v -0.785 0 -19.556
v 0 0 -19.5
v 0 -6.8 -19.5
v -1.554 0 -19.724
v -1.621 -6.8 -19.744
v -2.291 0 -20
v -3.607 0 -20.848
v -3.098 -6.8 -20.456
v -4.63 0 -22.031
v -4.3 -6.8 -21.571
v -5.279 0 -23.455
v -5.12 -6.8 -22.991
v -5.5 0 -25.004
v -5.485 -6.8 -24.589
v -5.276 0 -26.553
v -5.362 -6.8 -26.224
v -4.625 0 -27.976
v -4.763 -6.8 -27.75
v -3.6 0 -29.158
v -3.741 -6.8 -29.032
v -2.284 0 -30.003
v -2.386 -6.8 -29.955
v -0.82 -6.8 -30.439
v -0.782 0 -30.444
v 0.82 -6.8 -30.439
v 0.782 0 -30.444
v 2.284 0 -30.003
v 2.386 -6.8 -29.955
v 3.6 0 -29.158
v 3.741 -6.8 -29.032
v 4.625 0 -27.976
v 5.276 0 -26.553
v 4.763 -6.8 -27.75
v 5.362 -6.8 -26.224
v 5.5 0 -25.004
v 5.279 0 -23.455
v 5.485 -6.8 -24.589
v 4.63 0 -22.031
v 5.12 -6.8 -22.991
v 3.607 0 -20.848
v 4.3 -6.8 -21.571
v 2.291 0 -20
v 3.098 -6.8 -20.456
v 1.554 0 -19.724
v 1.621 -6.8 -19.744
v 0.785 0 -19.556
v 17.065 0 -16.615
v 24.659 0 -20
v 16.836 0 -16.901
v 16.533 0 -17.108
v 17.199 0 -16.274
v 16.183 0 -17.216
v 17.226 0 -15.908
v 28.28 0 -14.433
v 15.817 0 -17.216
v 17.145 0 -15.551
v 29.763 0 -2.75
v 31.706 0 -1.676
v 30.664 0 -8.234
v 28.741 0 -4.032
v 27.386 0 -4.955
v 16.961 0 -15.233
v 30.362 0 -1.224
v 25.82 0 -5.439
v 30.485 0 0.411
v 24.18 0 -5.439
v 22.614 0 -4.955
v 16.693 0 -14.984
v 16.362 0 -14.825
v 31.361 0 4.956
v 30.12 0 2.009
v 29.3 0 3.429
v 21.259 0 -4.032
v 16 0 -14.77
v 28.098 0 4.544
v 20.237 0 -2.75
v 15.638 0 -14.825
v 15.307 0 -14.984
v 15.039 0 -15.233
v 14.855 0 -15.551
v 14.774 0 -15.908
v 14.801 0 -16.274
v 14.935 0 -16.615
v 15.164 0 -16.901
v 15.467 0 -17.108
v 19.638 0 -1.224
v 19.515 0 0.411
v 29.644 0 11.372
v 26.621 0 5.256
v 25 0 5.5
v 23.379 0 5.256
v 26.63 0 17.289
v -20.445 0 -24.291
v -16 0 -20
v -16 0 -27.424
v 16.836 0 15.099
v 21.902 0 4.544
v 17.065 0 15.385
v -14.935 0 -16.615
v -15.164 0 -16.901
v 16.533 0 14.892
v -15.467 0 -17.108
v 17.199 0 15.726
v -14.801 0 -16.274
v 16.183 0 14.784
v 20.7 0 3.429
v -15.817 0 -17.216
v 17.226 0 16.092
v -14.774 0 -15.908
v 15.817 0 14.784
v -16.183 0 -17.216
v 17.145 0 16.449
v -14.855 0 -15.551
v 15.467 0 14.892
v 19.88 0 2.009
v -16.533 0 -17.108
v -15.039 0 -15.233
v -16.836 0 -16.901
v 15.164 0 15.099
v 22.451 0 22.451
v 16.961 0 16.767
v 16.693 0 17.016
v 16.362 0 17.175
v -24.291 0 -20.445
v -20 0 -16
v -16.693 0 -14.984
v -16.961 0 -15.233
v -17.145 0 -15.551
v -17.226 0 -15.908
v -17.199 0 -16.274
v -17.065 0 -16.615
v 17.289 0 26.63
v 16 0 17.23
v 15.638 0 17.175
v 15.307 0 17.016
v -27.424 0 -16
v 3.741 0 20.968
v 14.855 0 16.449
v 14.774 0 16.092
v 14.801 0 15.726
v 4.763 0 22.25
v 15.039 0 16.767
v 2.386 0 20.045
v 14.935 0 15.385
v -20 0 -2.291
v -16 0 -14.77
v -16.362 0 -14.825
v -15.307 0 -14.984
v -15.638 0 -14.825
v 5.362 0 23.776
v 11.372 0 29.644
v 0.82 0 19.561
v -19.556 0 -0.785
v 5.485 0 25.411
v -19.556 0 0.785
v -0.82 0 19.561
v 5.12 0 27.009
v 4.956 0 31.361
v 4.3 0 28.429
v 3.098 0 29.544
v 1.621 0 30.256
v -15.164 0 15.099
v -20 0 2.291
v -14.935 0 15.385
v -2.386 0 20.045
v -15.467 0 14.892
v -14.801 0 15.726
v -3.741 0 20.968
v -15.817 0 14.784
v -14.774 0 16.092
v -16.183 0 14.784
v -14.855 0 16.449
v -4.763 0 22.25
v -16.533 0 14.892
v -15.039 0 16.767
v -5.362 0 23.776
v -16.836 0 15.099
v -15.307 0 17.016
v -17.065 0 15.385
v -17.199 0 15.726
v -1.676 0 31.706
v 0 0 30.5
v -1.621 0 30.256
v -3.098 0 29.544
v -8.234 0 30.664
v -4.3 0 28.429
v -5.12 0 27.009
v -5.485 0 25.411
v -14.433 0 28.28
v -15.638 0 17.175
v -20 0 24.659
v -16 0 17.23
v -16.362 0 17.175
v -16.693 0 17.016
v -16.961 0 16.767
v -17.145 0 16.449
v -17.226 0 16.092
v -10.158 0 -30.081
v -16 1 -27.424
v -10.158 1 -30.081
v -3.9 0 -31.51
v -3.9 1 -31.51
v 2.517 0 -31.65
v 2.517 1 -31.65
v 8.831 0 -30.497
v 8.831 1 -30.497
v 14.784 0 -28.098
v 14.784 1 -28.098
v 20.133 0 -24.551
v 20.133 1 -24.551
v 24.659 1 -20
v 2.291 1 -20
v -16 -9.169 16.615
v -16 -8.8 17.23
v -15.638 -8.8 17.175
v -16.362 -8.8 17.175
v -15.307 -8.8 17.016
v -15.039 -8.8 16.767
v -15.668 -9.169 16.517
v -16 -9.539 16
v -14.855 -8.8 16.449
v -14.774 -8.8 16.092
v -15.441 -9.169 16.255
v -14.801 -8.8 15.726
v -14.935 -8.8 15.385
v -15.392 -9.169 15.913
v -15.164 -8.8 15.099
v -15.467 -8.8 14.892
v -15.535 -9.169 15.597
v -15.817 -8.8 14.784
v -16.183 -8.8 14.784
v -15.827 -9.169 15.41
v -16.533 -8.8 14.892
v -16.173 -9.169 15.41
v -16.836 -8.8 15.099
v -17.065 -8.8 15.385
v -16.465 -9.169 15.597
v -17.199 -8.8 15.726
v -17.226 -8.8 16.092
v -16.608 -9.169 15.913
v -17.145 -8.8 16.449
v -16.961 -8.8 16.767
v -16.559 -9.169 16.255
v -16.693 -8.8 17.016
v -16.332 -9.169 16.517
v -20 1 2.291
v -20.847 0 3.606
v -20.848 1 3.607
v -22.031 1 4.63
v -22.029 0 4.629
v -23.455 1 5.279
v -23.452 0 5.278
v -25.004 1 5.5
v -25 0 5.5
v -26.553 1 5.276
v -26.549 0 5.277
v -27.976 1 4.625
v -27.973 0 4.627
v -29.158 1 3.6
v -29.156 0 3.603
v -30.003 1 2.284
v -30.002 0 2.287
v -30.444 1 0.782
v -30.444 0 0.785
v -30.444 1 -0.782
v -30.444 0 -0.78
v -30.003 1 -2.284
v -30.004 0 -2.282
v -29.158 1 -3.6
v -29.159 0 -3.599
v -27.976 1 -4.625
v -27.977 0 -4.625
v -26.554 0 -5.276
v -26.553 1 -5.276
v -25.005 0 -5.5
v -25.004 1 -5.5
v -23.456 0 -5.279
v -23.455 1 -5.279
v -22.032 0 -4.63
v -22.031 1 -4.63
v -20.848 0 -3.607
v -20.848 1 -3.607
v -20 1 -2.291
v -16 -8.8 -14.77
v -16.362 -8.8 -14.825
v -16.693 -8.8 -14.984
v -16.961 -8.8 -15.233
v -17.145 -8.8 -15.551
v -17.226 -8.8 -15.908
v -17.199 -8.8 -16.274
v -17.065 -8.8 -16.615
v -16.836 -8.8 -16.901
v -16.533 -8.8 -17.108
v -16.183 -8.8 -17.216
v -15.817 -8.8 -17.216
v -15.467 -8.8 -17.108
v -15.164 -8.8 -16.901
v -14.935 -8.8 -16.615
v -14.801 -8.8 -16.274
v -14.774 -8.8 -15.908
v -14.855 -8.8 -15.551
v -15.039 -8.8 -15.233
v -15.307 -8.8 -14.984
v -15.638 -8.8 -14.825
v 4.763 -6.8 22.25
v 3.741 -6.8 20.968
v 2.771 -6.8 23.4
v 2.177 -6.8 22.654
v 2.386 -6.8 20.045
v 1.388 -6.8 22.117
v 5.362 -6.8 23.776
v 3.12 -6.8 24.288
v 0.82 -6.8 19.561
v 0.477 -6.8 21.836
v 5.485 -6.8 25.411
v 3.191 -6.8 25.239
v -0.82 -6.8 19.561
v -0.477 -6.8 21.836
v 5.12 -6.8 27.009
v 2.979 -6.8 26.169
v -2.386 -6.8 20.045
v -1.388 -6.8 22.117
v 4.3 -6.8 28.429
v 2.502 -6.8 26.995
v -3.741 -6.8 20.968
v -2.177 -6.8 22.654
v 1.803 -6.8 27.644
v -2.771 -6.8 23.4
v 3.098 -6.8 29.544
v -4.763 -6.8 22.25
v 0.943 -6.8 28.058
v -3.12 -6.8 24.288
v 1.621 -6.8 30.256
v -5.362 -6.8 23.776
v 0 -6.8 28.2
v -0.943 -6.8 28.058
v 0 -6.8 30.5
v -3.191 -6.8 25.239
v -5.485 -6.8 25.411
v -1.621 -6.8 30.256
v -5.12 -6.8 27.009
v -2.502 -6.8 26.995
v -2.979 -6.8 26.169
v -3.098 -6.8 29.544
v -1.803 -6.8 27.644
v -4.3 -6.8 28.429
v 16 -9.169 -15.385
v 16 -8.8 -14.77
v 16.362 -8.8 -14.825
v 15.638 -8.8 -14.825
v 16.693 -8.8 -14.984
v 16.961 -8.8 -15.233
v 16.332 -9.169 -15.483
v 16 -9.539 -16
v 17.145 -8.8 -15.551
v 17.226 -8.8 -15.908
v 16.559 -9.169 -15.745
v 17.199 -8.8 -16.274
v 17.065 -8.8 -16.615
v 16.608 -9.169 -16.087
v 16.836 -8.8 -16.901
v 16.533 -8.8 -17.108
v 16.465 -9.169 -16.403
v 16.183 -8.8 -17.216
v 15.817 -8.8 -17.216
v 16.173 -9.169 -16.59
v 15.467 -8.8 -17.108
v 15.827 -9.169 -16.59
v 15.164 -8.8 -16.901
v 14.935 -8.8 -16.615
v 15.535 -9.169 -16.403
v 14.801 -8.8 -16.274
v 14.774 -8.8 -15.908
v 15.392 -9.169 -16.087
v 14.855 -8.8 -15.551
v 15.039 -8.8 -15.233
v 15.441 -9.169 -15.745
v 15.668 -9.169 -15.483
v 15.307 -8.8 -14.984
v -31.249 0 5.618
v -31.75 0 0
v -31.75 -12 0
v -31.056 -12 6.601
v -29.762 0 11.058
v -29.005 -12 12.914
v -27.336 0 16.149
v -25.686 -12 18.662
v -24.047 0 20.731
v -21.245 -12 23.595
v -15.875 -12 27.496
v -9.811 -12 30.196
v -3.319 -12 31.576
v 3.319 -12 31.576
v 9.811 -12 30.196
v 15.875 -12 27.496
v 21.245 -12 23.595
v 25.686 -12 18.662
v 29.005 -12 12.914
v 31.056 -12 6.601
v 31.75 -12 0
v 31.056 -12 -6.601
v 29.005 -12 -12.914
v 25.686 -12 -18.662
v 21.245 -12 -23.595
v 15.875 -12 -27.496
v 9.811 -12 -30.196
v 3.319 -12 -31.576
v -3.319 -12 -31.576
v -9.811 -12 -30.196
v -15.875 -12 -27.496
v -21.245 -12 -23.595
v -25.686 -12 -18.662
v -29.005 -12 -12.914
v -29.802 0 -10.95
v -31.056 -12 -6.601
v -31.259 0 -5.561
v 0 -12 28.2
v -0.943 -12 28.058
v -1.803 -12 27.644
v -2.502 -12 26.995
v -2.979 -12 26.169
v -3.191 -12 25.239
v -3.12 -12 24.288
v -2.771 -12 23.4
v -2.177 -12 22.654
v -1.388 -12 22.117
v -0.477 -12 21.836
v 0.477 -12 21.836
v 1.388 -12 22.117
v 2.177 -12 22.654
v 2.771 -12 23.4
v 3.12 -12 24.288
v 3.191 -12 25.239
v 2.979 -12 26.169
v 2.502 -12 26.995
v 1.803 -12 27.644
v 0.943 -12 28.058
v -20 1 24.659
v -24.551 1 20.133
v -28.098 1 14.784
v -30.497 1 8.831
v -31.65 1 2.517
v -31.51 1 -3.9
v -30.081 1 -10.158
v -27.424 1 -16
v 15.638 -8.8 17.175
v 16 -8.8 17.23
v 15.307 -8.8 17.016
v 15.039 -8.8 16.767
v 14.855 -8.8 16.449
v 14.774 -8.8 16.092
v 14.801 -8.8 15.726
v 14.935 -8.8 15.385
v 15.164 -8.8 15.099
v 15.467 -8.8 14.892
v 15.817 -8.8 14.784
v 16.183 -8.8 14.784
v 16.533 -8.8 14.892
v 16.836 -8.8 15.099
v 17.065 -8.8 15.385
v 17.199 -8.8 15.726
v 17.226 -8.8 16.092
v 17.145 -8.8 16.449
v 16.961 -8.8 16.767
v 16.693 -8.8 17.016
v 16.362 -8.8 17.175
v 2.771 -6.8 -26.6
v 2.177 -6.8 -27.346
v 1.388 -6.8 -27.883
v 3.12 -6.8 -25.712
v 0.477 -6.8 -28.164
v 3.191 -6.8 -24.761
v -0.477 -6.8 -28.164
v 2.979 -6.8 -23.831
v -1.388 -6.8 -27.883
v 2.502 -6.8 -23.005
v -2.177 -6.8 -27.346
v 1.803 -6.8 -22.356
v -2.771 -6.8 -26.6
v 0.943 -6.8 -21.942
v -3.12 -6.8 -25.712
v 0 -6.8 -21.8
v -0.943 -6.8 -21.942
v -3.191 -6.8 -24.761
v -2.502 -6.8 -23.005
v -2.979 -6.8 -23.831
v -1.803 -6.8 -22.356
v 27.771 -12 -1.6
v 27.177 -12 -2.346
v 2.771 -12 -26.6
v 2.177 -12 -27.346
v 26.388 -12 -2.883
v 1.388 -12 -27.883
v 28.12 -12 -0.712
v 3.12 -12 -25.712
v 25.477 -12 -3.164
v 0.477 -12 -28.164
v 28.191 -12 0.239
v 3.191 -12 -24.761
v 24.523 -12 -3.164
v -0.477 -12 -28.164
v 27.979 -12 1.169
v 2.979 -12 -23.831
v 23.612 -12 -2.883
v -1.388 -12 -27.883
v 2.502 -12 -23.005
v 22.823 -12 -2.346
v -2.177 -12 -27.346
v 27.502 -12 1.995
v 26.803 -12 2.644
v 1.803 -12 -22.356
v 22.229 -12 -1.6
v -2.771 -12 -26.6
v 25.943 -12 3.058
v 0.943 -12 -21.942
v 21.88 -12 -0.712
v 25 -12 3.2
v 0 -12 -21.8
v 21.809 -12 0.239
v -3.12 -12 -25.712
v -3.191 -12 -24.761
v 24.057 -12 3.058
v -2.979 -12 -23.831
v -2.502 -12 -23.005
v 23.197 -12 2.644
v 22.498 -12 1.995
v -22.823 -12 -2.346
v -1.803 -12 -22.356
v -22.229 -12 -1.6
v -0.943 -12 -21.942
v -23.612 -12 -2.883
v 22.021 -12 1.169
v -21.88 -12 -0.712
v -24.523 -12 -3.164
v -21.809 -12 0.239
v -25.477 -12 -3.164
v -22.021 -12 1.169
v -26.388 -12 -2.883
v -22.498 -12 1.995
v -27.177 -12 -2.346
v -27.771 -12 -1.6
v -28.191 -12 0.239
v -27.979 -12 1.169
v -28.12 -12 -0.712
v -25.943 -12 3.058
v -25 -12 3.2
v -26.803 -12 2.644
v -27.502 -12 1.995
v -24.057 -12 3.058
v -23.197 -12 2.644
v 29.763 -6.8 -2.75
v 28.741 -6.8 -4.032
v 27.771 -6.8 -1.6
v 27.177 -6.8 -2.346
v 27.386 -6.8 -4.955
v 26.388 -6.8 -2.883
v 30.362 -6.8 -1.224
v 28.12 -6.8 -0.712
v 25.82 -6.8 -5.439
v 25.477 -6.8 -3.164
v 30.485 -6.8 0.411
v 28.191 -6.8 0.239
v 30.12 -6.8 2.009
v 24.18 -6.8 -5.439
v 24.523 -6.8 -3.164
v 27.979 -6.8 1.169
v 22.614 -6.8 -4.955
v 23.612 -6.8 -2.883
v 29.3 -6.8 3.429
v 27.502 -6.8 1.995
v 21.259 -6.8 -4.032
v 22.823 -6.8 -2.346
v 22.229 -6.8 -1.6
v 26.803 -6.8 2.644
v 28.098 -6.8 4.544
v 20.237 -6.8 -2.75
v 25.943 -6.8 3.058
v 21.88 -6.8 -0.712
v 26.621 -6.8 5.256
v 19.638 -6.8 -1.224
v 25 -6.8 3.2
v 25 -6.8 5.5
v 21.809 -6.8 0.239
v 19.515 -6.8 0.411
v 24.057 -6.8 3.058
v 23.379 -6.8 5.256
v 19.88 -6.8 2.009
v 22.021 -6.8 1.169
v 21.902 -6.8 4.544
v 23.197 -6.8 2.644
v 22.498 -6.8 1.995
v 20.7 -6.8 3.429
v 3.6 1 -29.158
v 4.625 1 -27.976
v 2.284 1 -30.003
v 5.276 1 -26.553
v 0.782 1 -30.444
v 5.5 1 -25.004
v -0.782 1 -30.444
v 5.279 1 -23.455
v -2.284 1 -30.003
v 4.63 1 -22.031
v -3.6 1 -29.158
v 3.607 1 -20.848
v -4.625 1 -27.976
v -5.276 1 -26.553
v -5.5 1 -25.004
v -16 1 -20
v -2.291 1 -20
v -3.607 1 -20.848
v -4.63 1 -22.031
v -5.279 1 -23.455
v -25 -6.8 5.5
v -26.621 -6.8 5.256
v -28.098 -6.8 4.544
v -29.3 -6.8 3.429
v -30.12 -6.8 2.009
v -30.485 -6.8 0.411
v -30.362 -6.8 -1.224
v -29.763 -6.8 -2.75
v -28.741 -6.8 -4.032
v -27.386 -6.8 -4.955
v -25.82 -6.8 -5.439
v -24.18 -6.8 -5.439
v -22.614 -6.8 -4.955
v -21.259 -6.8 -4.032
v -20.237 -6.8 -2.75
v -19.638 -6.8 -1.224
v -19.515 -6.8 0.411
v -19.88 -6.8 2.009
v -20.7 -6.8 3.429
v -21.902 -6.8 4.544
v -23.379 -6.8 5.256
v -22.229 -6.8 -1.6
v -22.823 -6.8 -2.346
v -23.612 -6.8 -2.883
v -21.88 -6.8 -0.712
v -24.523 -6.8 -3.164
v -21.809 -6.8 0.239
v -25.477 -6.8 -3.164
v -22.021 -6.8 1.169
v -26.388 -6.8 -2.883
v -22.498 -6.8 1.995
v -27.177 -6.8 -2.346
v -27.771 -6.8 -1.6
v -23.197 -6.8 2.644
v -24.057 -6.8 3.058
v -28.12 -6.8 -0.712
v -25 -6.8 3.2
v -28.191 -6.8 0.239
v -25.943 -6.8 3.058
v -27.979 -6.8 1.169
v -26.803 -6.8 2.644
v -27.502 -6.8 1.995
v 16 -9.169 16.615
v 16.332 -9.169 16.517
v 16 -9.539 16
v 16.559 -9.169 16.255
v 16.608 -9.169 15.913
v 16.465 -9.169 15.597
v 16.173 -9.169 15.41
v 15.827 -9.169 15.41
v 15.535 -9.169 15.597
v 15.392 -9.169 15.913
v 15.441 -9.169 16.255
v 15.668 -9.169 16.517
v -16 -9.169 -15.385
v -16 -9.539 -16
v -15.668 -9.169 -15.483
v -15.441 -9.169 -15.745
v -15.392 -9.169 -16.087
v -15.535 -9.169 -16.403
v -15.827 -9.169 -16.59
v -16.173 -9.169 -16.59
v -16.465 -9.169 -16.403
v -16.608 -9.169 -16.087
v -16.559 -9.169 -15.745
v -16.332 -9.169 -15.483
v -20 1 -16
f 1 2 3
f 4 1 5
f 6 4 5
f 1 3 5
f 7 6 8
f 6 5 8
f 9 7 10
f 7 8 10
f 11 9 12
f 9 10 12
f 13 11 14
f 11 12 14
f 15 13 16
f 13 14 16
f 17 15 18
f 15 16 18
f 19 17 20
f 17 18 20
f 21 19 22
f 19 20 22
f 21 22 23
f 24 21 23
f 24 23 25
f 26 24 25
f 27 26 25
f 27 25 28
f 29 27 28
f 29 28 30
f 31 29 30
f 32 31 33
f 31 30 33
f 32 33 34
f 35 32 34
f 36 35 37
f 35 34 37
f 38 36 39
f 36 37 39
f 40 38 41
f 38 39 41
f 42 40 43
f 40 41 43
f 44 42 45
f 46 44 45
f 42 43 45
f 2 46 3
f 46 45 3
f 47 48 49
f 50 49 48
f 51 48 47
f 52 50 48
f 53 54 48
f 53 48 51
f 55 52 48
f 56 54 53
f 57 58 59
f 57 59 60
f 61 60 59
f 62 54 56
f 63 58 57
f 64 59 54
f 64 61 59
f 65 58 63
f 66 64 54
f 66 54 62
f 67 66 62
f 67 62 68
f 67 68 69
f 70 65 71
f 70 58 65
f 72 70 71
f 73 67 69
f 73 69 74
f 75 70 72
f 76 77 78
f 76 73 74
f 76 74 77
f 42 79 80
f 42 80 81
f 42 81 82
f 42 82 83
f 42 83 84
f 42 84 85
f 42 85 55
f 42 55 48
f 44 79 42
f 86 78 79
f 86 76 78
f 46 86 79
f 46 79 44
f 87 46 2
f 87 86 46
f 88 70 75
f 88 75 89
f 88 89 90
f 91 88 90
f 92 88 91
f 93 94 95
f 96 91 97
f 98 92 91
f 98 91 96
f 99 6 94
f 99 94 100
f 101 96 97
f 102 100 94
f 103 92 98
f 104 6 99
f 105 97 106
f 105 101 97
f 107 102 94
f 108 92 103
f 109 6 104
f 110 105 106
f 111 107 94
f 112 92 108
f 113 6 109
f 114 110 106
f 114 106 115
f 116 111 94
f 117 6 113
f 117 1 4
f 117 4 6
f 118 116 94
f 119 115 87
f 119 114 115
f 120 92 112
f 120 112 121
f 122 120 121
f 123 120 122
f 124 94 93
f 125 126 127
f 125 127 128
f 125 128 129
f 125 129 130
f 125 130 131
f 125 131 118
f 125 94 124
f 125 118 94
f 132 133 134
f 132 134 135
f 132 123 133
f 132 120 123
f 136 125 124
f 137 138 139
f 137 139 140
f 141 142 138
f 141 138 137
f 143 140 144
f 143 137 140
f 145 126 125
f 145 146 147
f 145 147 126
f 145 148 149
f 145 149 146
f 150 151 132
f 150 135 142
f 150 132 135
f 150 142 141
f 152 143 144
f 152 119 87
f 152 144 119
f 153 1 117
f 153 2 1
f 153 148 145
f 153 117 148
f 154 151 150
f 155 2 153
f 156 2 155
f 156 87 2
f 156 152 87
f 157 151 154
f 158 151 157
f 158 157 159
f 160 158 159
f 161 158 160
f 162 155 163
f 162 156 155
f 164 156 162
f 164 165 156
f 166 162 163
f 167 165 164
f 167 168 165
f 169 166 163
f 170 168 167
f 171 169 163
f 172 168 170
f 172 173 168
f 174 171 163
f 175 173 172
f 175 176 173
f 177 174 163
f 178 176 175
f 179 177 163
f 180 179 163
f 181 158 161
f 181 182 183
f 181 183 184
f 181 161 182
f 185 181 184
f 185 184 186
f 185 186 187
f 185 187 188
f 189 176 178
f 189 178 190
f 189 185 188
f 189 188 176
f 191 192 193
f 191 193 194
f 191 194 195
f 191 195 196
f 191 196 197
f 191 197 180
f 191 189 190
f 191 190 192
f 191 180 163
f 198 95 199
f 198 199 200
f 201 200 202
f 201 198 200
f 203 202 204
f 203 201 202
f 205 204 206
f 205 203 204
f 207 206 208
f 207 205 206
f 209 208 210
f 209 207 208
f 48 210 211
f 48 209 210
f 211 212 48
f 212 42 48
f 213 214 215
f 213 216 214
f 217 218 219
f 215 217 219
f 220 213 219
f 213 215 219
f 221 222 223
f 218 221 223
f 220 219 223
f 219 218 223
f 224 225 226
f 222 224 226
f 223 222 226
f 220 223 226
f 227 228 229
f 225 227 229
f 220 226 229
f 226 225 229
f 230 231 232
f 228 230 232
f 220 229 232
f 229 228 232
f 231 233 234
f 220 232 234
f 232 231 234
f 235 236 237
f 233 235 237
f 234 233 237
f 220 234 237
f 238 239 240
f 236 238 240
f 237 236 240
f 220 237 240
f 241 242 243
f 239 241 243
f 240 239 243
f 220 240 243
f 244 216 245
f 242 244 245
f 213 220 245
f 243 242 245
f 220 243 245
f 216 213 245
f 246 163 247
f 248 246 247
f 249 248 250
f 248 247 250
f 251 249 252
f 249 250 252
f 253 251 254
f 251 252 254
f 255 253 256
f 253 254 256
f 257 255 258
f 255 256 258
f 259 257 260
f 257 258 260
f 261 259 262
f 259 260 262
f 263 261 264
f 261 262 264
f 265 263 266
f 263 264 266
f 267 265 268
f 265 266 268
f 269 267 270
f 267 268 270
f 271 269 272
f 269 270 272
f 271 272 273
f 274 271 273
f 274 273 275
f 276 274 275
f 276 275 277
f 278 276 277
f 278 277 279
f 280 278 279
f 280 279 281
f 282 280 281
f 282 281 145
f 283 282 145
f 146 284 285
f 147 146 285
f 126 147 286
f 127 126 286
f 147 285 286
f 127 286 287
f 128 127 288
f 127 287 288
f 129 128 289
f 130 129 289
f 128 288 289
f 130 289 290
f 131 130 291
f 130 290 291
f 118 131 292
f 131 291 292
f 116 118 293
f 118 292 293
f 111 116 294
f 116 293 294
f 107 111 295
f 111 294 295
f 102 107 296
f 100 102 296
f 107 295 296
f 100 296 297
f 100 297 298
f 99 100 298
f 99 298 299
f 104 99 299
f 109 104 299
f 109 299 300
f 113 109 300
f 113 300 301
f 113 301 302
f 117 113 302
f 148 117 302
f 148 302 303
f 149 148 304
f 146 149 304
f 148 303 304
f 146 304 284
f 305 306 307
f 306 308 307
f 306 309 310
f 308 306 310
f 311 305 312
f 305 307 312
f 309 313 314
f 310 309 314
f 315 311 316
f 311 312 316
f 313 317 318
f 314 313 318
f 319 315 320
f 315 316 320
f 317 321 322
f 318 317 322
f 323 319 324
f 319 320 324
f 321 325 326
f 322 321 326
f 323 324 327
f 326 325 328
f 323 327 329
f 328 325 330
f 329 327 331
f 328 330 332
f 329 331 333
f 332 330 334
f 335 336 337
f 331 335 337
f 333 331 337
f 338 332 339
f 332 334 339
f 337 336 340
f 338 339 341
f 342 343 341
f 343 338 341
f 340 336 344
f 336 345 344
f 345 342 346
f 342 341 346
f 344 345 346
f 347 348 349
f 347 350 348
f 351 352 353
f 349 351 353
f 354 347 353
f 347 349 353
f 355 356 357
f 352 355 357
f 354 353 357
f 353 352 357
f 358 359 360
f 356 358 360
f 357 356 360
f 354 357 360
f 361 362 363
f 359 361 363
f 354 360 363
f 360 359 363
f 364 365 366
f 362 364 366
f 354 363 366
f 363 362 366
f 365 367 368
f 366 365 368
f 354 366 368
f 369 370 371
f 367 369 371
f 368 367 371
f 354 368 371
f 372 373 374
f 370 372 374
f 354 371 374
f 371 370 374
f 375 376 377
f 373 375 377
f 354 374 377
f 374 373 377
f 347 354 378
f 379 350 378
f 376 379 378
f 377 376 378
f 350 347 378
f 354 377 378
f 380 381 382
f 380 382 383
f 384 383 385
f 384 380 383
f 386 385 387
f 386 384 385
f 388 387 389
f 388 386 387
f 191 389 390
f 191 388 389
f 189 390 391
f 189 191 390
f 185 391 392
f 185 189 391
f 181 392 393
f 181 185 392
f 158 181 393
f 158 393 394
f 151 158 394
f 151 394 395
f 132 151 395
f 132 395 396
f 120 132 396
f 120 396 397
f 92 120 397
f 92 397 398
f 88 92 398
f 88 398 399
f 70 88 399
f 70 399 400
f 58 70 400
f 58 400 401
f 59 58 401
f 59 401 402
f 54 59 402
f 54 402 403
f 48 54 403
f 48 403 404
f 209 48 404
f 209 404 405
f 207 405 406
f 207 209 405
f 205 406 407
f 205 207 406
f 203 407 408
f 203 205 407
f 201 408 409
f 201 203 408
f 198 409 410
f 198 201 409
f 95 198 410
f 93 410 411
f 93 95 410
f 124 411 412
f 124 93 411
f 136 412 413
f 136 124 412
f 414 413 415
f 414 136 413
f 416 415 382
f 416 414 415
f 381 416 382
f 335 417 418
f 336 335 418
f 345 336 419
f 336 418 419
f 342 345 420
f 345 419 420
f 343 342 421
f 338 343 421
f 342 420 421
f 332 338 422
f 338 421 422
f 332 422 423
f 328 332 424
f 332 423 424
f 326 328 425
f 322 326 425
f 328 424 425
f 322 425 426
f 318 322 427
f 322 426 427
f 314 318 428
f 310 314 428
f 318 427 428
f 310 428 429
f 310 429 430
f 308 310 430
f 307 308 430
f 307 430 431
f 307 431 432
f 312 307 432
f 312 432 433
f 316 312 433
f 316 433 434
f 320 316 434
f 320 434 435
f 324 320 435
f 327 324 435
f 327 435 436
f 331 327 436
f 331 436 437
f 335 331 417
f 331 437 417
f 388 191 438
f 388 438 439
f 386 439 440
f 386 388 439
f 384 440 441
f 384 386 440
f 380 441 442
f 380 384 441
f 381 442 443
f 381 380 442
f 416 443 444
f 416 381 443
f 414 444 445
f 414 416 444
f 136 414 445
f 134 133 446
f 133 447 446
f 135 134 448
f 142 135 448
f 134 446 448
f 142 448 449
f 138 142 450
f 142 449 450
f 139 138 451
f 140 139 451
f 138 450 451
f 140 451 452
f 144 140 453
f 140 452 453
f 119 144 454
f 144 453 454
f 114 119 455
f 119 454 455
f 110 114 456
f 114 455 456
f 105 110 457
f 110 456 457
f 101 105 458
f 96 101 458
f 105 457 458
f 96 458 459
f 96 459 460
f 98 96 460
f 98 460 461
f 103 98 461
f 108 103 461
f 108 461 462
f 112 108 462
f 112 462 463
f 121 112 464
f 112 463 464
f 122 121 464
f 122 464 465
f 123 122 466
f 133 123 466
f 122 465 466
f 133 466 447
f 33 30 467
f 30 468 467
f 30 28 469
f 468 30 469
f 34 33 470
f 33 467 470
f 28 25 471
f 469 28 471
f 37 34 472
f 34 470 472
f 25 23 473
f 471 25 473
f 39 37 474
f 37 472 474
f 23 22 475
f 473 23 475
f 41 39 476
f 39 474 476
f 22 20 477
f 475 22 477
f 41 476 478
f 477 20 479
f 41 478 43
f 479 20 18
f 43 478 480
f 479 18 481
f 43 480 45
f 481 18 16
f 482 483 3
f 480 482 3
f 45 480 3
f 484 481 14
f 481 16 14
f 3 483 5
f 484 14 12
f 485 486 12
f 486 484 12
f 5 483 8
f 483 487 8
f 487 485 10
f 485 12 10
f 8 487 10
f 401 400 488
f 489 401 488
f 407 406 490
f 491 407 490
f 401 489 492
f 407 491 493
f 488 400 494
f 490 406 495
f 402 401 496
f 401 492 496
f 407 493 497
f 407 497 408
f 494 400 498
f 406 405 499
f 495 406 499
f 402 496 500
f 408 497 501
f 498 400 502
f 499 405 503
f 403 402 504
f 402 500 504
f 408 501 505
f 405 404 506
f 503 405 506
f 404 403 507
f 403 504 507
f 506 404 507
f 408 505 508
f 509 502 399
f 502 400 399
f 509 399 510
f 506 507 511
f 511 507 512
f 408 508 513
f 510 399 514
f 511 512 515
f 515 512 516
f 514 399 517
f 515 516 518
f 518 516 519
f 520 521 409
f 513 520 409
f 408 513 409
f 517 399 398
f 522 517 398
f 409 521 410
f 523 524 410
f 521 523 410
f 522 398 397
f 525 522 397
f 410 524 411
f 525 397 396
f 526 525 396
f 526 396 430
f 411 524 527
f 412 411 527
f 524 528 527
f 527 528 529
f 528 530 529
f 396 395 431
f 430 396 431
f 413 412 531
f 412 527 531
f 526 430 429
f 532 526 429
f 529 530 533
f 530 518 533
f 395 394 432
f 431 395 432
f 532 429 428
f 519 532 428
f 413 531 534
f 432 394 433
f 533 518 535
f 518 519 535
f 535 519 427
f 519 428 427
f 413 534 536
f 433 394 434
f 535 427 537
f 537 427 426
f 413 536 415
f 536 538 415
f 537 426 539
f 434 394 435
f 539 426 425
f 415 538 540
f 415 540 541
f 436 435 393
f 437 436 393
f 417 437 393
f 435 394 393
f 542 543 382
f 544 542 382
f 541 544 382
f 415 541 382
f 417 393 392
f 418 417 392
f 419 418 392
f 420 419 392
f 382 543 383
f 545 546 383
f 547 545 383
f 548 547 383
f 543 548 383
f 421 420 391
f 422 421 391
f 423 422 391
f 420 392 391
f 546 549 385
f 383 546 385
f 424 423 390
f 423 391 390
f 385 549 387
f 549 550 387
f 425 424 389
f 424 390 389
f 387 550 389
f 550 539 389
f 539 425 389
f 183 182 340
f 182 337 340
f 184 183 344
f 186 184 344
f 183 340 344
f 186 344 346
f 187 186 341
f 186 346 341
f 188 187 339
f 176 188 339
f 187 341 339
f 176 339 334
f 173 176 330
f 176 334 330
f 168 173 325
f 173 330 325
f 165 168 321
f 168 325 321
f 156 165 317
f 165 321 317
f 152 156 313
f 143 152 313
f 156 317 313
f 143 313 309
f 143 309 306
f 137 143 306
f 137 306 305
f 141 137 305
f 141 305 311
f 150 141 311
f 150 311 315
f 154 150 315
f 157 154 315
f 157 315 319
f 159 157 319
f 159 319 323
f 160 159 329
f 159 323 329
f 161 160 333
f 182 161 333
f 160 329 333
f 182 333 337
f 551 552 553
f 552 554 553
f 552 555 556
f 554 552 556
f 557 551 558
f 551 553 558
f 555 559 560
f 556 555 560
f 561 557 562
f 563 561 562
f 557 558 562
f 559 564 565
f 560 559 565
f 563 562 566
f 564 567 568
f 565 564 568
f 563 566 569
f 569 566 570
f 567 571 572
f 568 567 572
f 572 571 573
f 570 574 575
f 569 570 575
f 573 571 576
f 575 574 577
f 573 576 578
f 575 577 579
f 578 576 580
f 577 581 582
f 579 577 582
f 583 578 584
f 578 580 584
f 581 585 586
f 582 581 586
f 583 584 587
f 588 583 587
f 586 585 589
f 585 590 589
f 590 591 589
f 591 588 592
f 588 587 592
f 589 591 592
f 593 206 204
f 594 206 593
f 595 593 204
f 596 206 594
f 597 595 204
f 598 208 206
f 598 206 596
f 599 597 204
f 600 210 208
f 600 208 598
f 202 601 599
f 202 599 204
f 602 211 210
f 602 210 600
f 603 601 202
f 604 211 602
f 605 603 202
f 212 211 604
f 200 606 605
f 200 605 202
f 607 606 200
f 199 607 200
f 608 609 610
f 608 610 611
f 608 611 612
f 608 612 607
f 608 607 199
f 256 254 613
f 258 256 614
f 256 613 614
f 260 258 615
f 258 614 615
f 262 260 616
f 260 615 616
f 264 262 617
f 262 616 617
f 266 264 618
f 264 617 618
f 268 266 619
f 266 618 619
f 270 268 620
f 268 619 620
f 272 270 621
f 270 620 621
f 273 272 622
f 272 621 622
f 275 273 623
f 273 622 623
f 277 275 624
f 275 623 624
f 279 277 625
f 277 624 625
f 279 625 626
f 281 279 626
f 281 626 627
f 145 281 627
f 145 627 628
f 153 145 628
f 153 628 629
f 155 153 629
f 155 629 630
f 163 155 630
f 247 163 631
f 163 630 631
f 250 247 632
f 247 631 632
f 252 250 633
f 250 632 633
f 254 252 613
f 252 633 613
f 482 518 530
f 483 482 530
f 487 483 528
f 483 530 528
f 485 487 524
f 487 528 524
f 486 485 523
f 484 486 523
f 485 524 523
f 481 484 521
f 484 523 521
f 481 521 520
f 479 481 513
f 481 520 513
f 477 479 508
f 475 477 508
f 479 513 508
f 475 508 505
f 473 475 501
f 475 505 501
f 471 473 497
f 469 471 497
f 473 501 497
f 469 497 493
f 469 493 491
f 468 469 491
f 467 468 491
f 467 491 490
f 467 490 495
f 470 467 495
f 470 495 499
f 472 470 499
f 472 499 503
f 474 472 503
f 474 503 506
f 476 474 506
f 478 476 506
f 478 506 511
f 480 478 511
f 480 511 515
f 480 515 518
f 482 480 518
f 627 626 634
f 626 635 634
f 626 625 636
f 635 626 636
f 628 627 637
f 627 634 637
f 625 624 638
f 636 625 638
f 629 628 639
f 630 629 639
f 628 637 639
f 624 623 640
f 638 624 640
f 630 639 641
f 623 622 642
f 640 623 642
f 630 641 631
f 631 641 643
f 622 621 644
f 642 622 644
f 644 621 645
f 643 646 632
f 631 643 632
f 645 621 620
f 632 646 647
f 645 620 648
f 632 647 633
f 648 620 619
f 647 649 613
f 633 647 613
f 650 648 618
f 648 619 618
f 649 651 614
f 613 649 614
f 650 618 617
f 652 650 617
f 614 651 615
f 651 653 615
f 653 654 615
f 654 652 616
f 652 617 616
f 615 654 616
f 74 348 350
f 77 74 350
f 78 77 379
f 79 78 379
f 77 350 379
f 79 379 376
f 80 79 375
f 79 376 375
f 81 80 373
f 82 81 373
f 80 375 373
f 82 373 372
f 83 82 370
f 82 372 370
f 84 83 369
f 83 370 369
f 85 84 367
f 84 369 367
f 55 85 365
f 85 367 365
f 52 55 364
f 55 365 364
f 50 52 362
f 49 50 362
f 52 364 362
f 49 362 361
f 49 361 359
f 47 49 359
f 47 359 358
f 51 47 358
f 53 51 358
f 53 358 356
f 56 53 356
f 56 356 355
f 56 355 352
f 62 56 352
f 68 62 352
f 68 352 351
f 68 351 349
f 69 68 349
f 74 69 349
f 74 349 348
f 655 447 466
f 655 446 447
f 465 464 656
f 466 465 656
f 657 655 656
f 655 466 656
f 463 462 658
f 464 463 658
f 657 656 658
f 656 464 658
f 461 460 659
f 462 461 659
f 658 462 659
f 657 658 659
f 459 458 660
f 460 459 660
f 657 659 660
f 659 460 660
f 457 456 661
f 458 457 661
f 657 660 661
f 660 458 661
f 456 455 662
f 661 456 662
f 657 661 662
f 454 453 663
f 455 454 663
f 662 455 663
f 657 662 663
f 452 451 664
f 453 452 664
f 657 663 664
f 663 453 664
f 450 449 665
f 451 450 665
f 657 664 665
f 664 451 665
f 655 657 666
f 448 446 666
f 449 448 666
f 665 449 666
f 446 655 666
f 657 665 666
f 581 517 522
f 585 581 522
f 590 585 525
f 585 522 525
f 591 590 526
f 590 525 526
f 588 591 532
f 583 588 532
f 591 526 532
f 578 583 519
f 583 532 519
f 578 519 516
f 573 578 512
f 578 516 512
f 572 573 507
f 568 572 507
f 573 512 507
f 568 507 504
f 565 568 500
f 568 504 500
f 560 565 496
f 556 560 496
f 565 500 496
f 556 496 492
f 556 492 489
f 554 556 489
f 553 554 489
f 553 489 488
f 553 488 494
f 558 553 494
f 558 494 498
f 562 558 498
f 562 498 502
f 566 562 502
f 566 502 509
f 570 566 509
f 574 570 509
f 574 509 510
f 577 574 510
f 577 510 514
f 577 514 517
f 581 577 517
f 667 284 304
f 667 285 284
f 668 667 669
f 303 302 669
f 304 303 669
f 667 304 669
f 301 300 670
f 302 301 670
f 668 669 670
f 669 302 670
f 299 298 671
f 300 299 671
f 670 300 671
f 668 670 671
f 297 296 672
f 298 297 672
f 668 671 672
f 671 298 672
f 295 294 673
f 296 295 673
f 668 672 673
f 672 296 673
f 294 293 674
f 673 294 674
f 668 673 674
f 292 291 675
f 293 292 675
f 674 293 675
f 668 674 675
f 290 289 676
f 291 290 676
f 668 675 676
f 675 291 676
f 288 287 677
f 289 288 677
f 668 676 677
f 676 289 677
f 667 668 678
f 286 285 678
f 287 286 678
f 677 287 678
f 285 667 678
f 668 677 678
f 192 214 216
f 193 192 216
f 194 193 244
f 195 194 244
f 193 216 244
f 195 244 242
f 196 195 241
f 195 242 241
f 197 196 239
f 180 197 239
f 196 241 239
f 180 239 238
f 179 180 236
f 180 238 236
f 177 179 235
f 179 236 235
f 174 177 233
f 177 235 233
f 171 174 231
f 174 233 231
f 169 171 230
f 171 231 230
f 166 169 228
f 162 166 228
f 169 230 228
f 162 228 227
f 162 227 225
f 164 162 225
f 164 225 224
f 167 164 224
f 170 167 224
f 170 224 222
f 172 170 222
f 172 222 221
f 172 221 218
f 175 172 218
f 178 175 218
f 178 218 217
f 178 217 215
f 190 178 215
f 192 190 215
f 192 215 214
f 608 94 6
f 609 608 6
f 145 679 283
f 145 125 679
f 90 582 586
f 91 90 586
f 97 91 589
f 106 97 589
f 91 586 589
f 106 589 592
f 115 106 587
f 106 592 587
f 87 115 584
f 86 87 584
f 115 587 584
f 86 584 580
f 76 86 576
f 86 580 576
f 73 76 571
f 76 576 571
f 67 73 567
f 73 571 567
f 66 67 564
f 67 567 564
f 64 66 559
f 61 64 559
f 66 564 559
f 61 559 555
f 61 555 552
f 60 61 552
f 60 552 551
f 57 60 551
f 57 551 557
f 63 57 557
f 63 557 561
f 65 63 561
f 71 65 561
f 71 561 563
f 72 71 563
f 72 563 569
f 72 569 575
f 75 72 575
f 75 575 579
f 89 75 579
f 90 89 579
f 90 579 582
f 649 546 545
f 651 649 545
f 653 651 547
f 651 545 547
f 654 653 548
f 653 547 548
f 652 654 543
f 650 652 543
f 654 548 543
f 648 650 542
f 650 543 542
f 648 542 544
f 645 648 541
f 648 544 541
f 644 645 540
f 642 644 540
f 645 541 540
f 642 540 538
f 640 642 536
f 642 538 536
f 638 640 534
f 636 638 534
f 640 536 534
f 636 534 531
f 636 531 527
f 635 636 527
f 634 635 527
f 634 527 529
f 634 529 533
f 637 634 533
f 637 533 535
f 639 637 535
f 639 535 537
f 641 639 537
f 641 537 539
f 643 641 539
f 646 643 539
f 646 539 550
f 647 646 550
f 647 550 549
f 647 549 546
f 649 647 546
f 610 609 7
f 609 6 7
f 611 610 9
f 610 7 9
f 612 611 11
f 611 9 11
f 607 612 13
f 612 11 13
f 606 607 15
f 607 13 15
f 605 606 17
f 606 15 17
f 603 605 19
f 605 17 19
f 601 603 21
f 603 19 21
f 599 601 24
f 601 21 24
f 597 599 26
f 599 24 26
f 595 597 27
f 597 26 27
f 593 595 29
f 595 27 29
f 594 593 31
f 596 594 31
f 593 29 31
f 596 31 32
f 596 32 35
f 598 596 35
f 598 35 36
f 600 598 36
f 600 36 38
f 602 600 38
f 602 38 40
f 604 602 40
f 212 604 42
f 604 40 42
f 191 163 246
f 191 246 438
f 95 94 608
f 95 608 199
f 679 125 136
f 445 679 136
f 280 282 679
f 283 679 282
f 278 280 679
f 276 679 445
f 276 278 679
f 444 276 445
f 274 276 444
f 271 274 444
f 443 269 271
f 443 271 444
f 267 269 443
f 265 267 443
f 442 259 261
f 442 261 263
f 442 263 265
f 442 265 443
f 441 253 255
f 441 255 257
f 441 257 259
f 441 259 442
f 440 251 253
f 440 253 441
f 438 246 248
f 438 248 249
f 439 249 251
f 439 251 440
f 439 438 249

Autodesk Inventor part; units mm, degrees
ref_plane "YZ Plane" through (0, 0, 0) normal (1, 0, 0) x (0, 1, 0)
ref_plane "XZ Plane" through (0, 0, 0) normal (0, 1, 0) x (-1, 0, 0)
ref_plane "XY Plane" through (0, 0, 0) normal (0, 0, 1) x (1, 0, 0)
sketch "Sketch1" plane through (0, 0, 0) normal (0, 1, 0) x (-1, 0, 0)
  circle A0 centre (0, 0) radius 25 construction
  line L0 (44.45, 0) -> (-44.45, 0) construction
  line L1 (0, -44.45) -> (0, 44.45) construction
  circle A1 centre (0, 0) radius 31.75
  circle A2 centre (0, 0) radius 16 construction
  line L2 (11.3137, 11.3137) -> (-11.3137, -11.3137) construction
  line L3 (-11.3137, 11.3137) -> (11.3137, -11.3137) construction
  line L4 (-20, 20) -> (20, 20) construction
  line L5 (20, 20) -> (20, -20) construction
  line L6 (20, -20) -> (-20, -20) construction
  line L7 (-20, -20) -> (-20, 20) construction
  line L8 (-20, 20) -> (20, -20) construction
  line L9 (20, 20) -> (-20, -20) construction
  line L10 (16, -20) -> (16, -27.4238)
  line L11 (16, -20) -> (-24.6589, -20)
  line L12 (20, -16) -> (27.4238, -16)
  line L13 (20, -16) -> (20, 24.6589)
  line L14 (16, -16) -> (-16, -16)
  line L15 (-16, -16) -> (-16, 16)
  line L16 (-16, 16) -> (16, 16)
  line L17 (16, 16) -> (16, -16)
  point P0 (0, 25)
  point P1 (25, 0)
  point P2 (0, -25)
  point P3 (-25, 0)
  point P4 (-16, 16)
  dimension "M6ClearancePatternDiameter" = 50
  dimension "diameter" = 63.5
  dimension "M3TappedPatternEdge" = 32
  dimension "d3" = 45
  dimension "d20" = 40
  dimension "d21" = 40
extrude "Extrusion1" add sketch "Sketch1" against normal blind 12 contours A1 L12 L13 | L13 L12 A1 L10 L11 | L11 L10 A1 | L14 L15 L16 L17
extrude "Extrusion3" add sketch "Sketch1" along normal blind 1 contours A1 L12 L13 | L11 L10 A1
hole "M3Tapped" at (-16, 0, -16) at (16, 0, -16) at (16, 0, 16) at (-16, 0, 16) direction (0, -1, 0) diameter 2.459 depth 8.8 tip angle 118 thread size "M3x0.5" class "6H" standard "ISO Metric profile"
hole "Hole4" at (0, 0, 25) at (-25, 0, 0) at (0, 0, -25) at (25, 0, 0) direction (0, -1, 0) diameter 6.4 end through all counterbore diameter 11 counterbore depth 6.8 clearance for "Socket Head Cap Screw ISO 4762" size "M6" standard "ISO"
sketch "Sketch2" plane through (0, 0, 0) normal (0, -1, 0) x (1, 0, 0)
  circle A0 centre (25, 0) radius 5.5 projected
  arc A1 (2.2913, -20) -> (-2.2913, -20) centre (0, -25) ccw projected
  arc A2 (-2.2913, -20) -> (2.2913, -20) centre (0, -25) ccw projected
  circle A3 centre (0, 25) radius 5.5 projected
  line L0 (-20, 24.6589) -> (-20, 2.2913) projected
  line L1 (-20, 2.2913) -> (-20, -2.2913) projected
  line L2 (-20, -2.2913) -> (-20, -16) projected
  line L3 (-20, -16) -> (-27.4238, -16) projected
  line L4 (-16, -27.4238) -> (-16, -20) projected
  line L5 (-16, -20) -> (-2.2913, -20) projected
  line L6 (-2.2913, -20) -> (2.2913, -20) projected
  line L7 (2.2913, -20) -> (24.6589, -20) projected
  arc A4 (-20, -2.2913) -> (-20, 2.2913) centre (-25, 0) ccw projected
  arc A5 (-20, 2.2913) -> (-20, -2.2913) centre (-25, 0) ccw projected
  arc A6 (-27.4238, -16) -> (-16, -27.4238) centre (0, 0) ccw projected
  arc A7 (-16, -27.4238) -> (24.6589, -20) centre (0, 0) ccw projected
  arc A8 (-20, 24.6589) -> (-27.4238, -16) centre (0, 0) ccw projected
  arc A9 (24.6589, -20) -> (-20, 24.6589) centre (0, 0) ccw projected
  circle A10 centre (16, 16) radius 1.2295 projected
  circle A11 centre (-16, -16) radius 1.2295 projected
  circle A12 centre (16, -16) radius 1.2295 projected
  circle A13 centre (-16, 16) radius 1.2295 projected
extrude "Extrusion4" cut sketch "Sketch2" against normal through all contours A2 L6 | L1 A5
equation "\"d21\" = d20"
equation "\"d4\" = thickness"
equation "\"d24\" = recessDepth"
equation "\"d40\" = recessDepth"
equation "\"thickness\" = 12"
equation "\"recessDepth\" = 1"
properties part number "FAB-OX0005"
